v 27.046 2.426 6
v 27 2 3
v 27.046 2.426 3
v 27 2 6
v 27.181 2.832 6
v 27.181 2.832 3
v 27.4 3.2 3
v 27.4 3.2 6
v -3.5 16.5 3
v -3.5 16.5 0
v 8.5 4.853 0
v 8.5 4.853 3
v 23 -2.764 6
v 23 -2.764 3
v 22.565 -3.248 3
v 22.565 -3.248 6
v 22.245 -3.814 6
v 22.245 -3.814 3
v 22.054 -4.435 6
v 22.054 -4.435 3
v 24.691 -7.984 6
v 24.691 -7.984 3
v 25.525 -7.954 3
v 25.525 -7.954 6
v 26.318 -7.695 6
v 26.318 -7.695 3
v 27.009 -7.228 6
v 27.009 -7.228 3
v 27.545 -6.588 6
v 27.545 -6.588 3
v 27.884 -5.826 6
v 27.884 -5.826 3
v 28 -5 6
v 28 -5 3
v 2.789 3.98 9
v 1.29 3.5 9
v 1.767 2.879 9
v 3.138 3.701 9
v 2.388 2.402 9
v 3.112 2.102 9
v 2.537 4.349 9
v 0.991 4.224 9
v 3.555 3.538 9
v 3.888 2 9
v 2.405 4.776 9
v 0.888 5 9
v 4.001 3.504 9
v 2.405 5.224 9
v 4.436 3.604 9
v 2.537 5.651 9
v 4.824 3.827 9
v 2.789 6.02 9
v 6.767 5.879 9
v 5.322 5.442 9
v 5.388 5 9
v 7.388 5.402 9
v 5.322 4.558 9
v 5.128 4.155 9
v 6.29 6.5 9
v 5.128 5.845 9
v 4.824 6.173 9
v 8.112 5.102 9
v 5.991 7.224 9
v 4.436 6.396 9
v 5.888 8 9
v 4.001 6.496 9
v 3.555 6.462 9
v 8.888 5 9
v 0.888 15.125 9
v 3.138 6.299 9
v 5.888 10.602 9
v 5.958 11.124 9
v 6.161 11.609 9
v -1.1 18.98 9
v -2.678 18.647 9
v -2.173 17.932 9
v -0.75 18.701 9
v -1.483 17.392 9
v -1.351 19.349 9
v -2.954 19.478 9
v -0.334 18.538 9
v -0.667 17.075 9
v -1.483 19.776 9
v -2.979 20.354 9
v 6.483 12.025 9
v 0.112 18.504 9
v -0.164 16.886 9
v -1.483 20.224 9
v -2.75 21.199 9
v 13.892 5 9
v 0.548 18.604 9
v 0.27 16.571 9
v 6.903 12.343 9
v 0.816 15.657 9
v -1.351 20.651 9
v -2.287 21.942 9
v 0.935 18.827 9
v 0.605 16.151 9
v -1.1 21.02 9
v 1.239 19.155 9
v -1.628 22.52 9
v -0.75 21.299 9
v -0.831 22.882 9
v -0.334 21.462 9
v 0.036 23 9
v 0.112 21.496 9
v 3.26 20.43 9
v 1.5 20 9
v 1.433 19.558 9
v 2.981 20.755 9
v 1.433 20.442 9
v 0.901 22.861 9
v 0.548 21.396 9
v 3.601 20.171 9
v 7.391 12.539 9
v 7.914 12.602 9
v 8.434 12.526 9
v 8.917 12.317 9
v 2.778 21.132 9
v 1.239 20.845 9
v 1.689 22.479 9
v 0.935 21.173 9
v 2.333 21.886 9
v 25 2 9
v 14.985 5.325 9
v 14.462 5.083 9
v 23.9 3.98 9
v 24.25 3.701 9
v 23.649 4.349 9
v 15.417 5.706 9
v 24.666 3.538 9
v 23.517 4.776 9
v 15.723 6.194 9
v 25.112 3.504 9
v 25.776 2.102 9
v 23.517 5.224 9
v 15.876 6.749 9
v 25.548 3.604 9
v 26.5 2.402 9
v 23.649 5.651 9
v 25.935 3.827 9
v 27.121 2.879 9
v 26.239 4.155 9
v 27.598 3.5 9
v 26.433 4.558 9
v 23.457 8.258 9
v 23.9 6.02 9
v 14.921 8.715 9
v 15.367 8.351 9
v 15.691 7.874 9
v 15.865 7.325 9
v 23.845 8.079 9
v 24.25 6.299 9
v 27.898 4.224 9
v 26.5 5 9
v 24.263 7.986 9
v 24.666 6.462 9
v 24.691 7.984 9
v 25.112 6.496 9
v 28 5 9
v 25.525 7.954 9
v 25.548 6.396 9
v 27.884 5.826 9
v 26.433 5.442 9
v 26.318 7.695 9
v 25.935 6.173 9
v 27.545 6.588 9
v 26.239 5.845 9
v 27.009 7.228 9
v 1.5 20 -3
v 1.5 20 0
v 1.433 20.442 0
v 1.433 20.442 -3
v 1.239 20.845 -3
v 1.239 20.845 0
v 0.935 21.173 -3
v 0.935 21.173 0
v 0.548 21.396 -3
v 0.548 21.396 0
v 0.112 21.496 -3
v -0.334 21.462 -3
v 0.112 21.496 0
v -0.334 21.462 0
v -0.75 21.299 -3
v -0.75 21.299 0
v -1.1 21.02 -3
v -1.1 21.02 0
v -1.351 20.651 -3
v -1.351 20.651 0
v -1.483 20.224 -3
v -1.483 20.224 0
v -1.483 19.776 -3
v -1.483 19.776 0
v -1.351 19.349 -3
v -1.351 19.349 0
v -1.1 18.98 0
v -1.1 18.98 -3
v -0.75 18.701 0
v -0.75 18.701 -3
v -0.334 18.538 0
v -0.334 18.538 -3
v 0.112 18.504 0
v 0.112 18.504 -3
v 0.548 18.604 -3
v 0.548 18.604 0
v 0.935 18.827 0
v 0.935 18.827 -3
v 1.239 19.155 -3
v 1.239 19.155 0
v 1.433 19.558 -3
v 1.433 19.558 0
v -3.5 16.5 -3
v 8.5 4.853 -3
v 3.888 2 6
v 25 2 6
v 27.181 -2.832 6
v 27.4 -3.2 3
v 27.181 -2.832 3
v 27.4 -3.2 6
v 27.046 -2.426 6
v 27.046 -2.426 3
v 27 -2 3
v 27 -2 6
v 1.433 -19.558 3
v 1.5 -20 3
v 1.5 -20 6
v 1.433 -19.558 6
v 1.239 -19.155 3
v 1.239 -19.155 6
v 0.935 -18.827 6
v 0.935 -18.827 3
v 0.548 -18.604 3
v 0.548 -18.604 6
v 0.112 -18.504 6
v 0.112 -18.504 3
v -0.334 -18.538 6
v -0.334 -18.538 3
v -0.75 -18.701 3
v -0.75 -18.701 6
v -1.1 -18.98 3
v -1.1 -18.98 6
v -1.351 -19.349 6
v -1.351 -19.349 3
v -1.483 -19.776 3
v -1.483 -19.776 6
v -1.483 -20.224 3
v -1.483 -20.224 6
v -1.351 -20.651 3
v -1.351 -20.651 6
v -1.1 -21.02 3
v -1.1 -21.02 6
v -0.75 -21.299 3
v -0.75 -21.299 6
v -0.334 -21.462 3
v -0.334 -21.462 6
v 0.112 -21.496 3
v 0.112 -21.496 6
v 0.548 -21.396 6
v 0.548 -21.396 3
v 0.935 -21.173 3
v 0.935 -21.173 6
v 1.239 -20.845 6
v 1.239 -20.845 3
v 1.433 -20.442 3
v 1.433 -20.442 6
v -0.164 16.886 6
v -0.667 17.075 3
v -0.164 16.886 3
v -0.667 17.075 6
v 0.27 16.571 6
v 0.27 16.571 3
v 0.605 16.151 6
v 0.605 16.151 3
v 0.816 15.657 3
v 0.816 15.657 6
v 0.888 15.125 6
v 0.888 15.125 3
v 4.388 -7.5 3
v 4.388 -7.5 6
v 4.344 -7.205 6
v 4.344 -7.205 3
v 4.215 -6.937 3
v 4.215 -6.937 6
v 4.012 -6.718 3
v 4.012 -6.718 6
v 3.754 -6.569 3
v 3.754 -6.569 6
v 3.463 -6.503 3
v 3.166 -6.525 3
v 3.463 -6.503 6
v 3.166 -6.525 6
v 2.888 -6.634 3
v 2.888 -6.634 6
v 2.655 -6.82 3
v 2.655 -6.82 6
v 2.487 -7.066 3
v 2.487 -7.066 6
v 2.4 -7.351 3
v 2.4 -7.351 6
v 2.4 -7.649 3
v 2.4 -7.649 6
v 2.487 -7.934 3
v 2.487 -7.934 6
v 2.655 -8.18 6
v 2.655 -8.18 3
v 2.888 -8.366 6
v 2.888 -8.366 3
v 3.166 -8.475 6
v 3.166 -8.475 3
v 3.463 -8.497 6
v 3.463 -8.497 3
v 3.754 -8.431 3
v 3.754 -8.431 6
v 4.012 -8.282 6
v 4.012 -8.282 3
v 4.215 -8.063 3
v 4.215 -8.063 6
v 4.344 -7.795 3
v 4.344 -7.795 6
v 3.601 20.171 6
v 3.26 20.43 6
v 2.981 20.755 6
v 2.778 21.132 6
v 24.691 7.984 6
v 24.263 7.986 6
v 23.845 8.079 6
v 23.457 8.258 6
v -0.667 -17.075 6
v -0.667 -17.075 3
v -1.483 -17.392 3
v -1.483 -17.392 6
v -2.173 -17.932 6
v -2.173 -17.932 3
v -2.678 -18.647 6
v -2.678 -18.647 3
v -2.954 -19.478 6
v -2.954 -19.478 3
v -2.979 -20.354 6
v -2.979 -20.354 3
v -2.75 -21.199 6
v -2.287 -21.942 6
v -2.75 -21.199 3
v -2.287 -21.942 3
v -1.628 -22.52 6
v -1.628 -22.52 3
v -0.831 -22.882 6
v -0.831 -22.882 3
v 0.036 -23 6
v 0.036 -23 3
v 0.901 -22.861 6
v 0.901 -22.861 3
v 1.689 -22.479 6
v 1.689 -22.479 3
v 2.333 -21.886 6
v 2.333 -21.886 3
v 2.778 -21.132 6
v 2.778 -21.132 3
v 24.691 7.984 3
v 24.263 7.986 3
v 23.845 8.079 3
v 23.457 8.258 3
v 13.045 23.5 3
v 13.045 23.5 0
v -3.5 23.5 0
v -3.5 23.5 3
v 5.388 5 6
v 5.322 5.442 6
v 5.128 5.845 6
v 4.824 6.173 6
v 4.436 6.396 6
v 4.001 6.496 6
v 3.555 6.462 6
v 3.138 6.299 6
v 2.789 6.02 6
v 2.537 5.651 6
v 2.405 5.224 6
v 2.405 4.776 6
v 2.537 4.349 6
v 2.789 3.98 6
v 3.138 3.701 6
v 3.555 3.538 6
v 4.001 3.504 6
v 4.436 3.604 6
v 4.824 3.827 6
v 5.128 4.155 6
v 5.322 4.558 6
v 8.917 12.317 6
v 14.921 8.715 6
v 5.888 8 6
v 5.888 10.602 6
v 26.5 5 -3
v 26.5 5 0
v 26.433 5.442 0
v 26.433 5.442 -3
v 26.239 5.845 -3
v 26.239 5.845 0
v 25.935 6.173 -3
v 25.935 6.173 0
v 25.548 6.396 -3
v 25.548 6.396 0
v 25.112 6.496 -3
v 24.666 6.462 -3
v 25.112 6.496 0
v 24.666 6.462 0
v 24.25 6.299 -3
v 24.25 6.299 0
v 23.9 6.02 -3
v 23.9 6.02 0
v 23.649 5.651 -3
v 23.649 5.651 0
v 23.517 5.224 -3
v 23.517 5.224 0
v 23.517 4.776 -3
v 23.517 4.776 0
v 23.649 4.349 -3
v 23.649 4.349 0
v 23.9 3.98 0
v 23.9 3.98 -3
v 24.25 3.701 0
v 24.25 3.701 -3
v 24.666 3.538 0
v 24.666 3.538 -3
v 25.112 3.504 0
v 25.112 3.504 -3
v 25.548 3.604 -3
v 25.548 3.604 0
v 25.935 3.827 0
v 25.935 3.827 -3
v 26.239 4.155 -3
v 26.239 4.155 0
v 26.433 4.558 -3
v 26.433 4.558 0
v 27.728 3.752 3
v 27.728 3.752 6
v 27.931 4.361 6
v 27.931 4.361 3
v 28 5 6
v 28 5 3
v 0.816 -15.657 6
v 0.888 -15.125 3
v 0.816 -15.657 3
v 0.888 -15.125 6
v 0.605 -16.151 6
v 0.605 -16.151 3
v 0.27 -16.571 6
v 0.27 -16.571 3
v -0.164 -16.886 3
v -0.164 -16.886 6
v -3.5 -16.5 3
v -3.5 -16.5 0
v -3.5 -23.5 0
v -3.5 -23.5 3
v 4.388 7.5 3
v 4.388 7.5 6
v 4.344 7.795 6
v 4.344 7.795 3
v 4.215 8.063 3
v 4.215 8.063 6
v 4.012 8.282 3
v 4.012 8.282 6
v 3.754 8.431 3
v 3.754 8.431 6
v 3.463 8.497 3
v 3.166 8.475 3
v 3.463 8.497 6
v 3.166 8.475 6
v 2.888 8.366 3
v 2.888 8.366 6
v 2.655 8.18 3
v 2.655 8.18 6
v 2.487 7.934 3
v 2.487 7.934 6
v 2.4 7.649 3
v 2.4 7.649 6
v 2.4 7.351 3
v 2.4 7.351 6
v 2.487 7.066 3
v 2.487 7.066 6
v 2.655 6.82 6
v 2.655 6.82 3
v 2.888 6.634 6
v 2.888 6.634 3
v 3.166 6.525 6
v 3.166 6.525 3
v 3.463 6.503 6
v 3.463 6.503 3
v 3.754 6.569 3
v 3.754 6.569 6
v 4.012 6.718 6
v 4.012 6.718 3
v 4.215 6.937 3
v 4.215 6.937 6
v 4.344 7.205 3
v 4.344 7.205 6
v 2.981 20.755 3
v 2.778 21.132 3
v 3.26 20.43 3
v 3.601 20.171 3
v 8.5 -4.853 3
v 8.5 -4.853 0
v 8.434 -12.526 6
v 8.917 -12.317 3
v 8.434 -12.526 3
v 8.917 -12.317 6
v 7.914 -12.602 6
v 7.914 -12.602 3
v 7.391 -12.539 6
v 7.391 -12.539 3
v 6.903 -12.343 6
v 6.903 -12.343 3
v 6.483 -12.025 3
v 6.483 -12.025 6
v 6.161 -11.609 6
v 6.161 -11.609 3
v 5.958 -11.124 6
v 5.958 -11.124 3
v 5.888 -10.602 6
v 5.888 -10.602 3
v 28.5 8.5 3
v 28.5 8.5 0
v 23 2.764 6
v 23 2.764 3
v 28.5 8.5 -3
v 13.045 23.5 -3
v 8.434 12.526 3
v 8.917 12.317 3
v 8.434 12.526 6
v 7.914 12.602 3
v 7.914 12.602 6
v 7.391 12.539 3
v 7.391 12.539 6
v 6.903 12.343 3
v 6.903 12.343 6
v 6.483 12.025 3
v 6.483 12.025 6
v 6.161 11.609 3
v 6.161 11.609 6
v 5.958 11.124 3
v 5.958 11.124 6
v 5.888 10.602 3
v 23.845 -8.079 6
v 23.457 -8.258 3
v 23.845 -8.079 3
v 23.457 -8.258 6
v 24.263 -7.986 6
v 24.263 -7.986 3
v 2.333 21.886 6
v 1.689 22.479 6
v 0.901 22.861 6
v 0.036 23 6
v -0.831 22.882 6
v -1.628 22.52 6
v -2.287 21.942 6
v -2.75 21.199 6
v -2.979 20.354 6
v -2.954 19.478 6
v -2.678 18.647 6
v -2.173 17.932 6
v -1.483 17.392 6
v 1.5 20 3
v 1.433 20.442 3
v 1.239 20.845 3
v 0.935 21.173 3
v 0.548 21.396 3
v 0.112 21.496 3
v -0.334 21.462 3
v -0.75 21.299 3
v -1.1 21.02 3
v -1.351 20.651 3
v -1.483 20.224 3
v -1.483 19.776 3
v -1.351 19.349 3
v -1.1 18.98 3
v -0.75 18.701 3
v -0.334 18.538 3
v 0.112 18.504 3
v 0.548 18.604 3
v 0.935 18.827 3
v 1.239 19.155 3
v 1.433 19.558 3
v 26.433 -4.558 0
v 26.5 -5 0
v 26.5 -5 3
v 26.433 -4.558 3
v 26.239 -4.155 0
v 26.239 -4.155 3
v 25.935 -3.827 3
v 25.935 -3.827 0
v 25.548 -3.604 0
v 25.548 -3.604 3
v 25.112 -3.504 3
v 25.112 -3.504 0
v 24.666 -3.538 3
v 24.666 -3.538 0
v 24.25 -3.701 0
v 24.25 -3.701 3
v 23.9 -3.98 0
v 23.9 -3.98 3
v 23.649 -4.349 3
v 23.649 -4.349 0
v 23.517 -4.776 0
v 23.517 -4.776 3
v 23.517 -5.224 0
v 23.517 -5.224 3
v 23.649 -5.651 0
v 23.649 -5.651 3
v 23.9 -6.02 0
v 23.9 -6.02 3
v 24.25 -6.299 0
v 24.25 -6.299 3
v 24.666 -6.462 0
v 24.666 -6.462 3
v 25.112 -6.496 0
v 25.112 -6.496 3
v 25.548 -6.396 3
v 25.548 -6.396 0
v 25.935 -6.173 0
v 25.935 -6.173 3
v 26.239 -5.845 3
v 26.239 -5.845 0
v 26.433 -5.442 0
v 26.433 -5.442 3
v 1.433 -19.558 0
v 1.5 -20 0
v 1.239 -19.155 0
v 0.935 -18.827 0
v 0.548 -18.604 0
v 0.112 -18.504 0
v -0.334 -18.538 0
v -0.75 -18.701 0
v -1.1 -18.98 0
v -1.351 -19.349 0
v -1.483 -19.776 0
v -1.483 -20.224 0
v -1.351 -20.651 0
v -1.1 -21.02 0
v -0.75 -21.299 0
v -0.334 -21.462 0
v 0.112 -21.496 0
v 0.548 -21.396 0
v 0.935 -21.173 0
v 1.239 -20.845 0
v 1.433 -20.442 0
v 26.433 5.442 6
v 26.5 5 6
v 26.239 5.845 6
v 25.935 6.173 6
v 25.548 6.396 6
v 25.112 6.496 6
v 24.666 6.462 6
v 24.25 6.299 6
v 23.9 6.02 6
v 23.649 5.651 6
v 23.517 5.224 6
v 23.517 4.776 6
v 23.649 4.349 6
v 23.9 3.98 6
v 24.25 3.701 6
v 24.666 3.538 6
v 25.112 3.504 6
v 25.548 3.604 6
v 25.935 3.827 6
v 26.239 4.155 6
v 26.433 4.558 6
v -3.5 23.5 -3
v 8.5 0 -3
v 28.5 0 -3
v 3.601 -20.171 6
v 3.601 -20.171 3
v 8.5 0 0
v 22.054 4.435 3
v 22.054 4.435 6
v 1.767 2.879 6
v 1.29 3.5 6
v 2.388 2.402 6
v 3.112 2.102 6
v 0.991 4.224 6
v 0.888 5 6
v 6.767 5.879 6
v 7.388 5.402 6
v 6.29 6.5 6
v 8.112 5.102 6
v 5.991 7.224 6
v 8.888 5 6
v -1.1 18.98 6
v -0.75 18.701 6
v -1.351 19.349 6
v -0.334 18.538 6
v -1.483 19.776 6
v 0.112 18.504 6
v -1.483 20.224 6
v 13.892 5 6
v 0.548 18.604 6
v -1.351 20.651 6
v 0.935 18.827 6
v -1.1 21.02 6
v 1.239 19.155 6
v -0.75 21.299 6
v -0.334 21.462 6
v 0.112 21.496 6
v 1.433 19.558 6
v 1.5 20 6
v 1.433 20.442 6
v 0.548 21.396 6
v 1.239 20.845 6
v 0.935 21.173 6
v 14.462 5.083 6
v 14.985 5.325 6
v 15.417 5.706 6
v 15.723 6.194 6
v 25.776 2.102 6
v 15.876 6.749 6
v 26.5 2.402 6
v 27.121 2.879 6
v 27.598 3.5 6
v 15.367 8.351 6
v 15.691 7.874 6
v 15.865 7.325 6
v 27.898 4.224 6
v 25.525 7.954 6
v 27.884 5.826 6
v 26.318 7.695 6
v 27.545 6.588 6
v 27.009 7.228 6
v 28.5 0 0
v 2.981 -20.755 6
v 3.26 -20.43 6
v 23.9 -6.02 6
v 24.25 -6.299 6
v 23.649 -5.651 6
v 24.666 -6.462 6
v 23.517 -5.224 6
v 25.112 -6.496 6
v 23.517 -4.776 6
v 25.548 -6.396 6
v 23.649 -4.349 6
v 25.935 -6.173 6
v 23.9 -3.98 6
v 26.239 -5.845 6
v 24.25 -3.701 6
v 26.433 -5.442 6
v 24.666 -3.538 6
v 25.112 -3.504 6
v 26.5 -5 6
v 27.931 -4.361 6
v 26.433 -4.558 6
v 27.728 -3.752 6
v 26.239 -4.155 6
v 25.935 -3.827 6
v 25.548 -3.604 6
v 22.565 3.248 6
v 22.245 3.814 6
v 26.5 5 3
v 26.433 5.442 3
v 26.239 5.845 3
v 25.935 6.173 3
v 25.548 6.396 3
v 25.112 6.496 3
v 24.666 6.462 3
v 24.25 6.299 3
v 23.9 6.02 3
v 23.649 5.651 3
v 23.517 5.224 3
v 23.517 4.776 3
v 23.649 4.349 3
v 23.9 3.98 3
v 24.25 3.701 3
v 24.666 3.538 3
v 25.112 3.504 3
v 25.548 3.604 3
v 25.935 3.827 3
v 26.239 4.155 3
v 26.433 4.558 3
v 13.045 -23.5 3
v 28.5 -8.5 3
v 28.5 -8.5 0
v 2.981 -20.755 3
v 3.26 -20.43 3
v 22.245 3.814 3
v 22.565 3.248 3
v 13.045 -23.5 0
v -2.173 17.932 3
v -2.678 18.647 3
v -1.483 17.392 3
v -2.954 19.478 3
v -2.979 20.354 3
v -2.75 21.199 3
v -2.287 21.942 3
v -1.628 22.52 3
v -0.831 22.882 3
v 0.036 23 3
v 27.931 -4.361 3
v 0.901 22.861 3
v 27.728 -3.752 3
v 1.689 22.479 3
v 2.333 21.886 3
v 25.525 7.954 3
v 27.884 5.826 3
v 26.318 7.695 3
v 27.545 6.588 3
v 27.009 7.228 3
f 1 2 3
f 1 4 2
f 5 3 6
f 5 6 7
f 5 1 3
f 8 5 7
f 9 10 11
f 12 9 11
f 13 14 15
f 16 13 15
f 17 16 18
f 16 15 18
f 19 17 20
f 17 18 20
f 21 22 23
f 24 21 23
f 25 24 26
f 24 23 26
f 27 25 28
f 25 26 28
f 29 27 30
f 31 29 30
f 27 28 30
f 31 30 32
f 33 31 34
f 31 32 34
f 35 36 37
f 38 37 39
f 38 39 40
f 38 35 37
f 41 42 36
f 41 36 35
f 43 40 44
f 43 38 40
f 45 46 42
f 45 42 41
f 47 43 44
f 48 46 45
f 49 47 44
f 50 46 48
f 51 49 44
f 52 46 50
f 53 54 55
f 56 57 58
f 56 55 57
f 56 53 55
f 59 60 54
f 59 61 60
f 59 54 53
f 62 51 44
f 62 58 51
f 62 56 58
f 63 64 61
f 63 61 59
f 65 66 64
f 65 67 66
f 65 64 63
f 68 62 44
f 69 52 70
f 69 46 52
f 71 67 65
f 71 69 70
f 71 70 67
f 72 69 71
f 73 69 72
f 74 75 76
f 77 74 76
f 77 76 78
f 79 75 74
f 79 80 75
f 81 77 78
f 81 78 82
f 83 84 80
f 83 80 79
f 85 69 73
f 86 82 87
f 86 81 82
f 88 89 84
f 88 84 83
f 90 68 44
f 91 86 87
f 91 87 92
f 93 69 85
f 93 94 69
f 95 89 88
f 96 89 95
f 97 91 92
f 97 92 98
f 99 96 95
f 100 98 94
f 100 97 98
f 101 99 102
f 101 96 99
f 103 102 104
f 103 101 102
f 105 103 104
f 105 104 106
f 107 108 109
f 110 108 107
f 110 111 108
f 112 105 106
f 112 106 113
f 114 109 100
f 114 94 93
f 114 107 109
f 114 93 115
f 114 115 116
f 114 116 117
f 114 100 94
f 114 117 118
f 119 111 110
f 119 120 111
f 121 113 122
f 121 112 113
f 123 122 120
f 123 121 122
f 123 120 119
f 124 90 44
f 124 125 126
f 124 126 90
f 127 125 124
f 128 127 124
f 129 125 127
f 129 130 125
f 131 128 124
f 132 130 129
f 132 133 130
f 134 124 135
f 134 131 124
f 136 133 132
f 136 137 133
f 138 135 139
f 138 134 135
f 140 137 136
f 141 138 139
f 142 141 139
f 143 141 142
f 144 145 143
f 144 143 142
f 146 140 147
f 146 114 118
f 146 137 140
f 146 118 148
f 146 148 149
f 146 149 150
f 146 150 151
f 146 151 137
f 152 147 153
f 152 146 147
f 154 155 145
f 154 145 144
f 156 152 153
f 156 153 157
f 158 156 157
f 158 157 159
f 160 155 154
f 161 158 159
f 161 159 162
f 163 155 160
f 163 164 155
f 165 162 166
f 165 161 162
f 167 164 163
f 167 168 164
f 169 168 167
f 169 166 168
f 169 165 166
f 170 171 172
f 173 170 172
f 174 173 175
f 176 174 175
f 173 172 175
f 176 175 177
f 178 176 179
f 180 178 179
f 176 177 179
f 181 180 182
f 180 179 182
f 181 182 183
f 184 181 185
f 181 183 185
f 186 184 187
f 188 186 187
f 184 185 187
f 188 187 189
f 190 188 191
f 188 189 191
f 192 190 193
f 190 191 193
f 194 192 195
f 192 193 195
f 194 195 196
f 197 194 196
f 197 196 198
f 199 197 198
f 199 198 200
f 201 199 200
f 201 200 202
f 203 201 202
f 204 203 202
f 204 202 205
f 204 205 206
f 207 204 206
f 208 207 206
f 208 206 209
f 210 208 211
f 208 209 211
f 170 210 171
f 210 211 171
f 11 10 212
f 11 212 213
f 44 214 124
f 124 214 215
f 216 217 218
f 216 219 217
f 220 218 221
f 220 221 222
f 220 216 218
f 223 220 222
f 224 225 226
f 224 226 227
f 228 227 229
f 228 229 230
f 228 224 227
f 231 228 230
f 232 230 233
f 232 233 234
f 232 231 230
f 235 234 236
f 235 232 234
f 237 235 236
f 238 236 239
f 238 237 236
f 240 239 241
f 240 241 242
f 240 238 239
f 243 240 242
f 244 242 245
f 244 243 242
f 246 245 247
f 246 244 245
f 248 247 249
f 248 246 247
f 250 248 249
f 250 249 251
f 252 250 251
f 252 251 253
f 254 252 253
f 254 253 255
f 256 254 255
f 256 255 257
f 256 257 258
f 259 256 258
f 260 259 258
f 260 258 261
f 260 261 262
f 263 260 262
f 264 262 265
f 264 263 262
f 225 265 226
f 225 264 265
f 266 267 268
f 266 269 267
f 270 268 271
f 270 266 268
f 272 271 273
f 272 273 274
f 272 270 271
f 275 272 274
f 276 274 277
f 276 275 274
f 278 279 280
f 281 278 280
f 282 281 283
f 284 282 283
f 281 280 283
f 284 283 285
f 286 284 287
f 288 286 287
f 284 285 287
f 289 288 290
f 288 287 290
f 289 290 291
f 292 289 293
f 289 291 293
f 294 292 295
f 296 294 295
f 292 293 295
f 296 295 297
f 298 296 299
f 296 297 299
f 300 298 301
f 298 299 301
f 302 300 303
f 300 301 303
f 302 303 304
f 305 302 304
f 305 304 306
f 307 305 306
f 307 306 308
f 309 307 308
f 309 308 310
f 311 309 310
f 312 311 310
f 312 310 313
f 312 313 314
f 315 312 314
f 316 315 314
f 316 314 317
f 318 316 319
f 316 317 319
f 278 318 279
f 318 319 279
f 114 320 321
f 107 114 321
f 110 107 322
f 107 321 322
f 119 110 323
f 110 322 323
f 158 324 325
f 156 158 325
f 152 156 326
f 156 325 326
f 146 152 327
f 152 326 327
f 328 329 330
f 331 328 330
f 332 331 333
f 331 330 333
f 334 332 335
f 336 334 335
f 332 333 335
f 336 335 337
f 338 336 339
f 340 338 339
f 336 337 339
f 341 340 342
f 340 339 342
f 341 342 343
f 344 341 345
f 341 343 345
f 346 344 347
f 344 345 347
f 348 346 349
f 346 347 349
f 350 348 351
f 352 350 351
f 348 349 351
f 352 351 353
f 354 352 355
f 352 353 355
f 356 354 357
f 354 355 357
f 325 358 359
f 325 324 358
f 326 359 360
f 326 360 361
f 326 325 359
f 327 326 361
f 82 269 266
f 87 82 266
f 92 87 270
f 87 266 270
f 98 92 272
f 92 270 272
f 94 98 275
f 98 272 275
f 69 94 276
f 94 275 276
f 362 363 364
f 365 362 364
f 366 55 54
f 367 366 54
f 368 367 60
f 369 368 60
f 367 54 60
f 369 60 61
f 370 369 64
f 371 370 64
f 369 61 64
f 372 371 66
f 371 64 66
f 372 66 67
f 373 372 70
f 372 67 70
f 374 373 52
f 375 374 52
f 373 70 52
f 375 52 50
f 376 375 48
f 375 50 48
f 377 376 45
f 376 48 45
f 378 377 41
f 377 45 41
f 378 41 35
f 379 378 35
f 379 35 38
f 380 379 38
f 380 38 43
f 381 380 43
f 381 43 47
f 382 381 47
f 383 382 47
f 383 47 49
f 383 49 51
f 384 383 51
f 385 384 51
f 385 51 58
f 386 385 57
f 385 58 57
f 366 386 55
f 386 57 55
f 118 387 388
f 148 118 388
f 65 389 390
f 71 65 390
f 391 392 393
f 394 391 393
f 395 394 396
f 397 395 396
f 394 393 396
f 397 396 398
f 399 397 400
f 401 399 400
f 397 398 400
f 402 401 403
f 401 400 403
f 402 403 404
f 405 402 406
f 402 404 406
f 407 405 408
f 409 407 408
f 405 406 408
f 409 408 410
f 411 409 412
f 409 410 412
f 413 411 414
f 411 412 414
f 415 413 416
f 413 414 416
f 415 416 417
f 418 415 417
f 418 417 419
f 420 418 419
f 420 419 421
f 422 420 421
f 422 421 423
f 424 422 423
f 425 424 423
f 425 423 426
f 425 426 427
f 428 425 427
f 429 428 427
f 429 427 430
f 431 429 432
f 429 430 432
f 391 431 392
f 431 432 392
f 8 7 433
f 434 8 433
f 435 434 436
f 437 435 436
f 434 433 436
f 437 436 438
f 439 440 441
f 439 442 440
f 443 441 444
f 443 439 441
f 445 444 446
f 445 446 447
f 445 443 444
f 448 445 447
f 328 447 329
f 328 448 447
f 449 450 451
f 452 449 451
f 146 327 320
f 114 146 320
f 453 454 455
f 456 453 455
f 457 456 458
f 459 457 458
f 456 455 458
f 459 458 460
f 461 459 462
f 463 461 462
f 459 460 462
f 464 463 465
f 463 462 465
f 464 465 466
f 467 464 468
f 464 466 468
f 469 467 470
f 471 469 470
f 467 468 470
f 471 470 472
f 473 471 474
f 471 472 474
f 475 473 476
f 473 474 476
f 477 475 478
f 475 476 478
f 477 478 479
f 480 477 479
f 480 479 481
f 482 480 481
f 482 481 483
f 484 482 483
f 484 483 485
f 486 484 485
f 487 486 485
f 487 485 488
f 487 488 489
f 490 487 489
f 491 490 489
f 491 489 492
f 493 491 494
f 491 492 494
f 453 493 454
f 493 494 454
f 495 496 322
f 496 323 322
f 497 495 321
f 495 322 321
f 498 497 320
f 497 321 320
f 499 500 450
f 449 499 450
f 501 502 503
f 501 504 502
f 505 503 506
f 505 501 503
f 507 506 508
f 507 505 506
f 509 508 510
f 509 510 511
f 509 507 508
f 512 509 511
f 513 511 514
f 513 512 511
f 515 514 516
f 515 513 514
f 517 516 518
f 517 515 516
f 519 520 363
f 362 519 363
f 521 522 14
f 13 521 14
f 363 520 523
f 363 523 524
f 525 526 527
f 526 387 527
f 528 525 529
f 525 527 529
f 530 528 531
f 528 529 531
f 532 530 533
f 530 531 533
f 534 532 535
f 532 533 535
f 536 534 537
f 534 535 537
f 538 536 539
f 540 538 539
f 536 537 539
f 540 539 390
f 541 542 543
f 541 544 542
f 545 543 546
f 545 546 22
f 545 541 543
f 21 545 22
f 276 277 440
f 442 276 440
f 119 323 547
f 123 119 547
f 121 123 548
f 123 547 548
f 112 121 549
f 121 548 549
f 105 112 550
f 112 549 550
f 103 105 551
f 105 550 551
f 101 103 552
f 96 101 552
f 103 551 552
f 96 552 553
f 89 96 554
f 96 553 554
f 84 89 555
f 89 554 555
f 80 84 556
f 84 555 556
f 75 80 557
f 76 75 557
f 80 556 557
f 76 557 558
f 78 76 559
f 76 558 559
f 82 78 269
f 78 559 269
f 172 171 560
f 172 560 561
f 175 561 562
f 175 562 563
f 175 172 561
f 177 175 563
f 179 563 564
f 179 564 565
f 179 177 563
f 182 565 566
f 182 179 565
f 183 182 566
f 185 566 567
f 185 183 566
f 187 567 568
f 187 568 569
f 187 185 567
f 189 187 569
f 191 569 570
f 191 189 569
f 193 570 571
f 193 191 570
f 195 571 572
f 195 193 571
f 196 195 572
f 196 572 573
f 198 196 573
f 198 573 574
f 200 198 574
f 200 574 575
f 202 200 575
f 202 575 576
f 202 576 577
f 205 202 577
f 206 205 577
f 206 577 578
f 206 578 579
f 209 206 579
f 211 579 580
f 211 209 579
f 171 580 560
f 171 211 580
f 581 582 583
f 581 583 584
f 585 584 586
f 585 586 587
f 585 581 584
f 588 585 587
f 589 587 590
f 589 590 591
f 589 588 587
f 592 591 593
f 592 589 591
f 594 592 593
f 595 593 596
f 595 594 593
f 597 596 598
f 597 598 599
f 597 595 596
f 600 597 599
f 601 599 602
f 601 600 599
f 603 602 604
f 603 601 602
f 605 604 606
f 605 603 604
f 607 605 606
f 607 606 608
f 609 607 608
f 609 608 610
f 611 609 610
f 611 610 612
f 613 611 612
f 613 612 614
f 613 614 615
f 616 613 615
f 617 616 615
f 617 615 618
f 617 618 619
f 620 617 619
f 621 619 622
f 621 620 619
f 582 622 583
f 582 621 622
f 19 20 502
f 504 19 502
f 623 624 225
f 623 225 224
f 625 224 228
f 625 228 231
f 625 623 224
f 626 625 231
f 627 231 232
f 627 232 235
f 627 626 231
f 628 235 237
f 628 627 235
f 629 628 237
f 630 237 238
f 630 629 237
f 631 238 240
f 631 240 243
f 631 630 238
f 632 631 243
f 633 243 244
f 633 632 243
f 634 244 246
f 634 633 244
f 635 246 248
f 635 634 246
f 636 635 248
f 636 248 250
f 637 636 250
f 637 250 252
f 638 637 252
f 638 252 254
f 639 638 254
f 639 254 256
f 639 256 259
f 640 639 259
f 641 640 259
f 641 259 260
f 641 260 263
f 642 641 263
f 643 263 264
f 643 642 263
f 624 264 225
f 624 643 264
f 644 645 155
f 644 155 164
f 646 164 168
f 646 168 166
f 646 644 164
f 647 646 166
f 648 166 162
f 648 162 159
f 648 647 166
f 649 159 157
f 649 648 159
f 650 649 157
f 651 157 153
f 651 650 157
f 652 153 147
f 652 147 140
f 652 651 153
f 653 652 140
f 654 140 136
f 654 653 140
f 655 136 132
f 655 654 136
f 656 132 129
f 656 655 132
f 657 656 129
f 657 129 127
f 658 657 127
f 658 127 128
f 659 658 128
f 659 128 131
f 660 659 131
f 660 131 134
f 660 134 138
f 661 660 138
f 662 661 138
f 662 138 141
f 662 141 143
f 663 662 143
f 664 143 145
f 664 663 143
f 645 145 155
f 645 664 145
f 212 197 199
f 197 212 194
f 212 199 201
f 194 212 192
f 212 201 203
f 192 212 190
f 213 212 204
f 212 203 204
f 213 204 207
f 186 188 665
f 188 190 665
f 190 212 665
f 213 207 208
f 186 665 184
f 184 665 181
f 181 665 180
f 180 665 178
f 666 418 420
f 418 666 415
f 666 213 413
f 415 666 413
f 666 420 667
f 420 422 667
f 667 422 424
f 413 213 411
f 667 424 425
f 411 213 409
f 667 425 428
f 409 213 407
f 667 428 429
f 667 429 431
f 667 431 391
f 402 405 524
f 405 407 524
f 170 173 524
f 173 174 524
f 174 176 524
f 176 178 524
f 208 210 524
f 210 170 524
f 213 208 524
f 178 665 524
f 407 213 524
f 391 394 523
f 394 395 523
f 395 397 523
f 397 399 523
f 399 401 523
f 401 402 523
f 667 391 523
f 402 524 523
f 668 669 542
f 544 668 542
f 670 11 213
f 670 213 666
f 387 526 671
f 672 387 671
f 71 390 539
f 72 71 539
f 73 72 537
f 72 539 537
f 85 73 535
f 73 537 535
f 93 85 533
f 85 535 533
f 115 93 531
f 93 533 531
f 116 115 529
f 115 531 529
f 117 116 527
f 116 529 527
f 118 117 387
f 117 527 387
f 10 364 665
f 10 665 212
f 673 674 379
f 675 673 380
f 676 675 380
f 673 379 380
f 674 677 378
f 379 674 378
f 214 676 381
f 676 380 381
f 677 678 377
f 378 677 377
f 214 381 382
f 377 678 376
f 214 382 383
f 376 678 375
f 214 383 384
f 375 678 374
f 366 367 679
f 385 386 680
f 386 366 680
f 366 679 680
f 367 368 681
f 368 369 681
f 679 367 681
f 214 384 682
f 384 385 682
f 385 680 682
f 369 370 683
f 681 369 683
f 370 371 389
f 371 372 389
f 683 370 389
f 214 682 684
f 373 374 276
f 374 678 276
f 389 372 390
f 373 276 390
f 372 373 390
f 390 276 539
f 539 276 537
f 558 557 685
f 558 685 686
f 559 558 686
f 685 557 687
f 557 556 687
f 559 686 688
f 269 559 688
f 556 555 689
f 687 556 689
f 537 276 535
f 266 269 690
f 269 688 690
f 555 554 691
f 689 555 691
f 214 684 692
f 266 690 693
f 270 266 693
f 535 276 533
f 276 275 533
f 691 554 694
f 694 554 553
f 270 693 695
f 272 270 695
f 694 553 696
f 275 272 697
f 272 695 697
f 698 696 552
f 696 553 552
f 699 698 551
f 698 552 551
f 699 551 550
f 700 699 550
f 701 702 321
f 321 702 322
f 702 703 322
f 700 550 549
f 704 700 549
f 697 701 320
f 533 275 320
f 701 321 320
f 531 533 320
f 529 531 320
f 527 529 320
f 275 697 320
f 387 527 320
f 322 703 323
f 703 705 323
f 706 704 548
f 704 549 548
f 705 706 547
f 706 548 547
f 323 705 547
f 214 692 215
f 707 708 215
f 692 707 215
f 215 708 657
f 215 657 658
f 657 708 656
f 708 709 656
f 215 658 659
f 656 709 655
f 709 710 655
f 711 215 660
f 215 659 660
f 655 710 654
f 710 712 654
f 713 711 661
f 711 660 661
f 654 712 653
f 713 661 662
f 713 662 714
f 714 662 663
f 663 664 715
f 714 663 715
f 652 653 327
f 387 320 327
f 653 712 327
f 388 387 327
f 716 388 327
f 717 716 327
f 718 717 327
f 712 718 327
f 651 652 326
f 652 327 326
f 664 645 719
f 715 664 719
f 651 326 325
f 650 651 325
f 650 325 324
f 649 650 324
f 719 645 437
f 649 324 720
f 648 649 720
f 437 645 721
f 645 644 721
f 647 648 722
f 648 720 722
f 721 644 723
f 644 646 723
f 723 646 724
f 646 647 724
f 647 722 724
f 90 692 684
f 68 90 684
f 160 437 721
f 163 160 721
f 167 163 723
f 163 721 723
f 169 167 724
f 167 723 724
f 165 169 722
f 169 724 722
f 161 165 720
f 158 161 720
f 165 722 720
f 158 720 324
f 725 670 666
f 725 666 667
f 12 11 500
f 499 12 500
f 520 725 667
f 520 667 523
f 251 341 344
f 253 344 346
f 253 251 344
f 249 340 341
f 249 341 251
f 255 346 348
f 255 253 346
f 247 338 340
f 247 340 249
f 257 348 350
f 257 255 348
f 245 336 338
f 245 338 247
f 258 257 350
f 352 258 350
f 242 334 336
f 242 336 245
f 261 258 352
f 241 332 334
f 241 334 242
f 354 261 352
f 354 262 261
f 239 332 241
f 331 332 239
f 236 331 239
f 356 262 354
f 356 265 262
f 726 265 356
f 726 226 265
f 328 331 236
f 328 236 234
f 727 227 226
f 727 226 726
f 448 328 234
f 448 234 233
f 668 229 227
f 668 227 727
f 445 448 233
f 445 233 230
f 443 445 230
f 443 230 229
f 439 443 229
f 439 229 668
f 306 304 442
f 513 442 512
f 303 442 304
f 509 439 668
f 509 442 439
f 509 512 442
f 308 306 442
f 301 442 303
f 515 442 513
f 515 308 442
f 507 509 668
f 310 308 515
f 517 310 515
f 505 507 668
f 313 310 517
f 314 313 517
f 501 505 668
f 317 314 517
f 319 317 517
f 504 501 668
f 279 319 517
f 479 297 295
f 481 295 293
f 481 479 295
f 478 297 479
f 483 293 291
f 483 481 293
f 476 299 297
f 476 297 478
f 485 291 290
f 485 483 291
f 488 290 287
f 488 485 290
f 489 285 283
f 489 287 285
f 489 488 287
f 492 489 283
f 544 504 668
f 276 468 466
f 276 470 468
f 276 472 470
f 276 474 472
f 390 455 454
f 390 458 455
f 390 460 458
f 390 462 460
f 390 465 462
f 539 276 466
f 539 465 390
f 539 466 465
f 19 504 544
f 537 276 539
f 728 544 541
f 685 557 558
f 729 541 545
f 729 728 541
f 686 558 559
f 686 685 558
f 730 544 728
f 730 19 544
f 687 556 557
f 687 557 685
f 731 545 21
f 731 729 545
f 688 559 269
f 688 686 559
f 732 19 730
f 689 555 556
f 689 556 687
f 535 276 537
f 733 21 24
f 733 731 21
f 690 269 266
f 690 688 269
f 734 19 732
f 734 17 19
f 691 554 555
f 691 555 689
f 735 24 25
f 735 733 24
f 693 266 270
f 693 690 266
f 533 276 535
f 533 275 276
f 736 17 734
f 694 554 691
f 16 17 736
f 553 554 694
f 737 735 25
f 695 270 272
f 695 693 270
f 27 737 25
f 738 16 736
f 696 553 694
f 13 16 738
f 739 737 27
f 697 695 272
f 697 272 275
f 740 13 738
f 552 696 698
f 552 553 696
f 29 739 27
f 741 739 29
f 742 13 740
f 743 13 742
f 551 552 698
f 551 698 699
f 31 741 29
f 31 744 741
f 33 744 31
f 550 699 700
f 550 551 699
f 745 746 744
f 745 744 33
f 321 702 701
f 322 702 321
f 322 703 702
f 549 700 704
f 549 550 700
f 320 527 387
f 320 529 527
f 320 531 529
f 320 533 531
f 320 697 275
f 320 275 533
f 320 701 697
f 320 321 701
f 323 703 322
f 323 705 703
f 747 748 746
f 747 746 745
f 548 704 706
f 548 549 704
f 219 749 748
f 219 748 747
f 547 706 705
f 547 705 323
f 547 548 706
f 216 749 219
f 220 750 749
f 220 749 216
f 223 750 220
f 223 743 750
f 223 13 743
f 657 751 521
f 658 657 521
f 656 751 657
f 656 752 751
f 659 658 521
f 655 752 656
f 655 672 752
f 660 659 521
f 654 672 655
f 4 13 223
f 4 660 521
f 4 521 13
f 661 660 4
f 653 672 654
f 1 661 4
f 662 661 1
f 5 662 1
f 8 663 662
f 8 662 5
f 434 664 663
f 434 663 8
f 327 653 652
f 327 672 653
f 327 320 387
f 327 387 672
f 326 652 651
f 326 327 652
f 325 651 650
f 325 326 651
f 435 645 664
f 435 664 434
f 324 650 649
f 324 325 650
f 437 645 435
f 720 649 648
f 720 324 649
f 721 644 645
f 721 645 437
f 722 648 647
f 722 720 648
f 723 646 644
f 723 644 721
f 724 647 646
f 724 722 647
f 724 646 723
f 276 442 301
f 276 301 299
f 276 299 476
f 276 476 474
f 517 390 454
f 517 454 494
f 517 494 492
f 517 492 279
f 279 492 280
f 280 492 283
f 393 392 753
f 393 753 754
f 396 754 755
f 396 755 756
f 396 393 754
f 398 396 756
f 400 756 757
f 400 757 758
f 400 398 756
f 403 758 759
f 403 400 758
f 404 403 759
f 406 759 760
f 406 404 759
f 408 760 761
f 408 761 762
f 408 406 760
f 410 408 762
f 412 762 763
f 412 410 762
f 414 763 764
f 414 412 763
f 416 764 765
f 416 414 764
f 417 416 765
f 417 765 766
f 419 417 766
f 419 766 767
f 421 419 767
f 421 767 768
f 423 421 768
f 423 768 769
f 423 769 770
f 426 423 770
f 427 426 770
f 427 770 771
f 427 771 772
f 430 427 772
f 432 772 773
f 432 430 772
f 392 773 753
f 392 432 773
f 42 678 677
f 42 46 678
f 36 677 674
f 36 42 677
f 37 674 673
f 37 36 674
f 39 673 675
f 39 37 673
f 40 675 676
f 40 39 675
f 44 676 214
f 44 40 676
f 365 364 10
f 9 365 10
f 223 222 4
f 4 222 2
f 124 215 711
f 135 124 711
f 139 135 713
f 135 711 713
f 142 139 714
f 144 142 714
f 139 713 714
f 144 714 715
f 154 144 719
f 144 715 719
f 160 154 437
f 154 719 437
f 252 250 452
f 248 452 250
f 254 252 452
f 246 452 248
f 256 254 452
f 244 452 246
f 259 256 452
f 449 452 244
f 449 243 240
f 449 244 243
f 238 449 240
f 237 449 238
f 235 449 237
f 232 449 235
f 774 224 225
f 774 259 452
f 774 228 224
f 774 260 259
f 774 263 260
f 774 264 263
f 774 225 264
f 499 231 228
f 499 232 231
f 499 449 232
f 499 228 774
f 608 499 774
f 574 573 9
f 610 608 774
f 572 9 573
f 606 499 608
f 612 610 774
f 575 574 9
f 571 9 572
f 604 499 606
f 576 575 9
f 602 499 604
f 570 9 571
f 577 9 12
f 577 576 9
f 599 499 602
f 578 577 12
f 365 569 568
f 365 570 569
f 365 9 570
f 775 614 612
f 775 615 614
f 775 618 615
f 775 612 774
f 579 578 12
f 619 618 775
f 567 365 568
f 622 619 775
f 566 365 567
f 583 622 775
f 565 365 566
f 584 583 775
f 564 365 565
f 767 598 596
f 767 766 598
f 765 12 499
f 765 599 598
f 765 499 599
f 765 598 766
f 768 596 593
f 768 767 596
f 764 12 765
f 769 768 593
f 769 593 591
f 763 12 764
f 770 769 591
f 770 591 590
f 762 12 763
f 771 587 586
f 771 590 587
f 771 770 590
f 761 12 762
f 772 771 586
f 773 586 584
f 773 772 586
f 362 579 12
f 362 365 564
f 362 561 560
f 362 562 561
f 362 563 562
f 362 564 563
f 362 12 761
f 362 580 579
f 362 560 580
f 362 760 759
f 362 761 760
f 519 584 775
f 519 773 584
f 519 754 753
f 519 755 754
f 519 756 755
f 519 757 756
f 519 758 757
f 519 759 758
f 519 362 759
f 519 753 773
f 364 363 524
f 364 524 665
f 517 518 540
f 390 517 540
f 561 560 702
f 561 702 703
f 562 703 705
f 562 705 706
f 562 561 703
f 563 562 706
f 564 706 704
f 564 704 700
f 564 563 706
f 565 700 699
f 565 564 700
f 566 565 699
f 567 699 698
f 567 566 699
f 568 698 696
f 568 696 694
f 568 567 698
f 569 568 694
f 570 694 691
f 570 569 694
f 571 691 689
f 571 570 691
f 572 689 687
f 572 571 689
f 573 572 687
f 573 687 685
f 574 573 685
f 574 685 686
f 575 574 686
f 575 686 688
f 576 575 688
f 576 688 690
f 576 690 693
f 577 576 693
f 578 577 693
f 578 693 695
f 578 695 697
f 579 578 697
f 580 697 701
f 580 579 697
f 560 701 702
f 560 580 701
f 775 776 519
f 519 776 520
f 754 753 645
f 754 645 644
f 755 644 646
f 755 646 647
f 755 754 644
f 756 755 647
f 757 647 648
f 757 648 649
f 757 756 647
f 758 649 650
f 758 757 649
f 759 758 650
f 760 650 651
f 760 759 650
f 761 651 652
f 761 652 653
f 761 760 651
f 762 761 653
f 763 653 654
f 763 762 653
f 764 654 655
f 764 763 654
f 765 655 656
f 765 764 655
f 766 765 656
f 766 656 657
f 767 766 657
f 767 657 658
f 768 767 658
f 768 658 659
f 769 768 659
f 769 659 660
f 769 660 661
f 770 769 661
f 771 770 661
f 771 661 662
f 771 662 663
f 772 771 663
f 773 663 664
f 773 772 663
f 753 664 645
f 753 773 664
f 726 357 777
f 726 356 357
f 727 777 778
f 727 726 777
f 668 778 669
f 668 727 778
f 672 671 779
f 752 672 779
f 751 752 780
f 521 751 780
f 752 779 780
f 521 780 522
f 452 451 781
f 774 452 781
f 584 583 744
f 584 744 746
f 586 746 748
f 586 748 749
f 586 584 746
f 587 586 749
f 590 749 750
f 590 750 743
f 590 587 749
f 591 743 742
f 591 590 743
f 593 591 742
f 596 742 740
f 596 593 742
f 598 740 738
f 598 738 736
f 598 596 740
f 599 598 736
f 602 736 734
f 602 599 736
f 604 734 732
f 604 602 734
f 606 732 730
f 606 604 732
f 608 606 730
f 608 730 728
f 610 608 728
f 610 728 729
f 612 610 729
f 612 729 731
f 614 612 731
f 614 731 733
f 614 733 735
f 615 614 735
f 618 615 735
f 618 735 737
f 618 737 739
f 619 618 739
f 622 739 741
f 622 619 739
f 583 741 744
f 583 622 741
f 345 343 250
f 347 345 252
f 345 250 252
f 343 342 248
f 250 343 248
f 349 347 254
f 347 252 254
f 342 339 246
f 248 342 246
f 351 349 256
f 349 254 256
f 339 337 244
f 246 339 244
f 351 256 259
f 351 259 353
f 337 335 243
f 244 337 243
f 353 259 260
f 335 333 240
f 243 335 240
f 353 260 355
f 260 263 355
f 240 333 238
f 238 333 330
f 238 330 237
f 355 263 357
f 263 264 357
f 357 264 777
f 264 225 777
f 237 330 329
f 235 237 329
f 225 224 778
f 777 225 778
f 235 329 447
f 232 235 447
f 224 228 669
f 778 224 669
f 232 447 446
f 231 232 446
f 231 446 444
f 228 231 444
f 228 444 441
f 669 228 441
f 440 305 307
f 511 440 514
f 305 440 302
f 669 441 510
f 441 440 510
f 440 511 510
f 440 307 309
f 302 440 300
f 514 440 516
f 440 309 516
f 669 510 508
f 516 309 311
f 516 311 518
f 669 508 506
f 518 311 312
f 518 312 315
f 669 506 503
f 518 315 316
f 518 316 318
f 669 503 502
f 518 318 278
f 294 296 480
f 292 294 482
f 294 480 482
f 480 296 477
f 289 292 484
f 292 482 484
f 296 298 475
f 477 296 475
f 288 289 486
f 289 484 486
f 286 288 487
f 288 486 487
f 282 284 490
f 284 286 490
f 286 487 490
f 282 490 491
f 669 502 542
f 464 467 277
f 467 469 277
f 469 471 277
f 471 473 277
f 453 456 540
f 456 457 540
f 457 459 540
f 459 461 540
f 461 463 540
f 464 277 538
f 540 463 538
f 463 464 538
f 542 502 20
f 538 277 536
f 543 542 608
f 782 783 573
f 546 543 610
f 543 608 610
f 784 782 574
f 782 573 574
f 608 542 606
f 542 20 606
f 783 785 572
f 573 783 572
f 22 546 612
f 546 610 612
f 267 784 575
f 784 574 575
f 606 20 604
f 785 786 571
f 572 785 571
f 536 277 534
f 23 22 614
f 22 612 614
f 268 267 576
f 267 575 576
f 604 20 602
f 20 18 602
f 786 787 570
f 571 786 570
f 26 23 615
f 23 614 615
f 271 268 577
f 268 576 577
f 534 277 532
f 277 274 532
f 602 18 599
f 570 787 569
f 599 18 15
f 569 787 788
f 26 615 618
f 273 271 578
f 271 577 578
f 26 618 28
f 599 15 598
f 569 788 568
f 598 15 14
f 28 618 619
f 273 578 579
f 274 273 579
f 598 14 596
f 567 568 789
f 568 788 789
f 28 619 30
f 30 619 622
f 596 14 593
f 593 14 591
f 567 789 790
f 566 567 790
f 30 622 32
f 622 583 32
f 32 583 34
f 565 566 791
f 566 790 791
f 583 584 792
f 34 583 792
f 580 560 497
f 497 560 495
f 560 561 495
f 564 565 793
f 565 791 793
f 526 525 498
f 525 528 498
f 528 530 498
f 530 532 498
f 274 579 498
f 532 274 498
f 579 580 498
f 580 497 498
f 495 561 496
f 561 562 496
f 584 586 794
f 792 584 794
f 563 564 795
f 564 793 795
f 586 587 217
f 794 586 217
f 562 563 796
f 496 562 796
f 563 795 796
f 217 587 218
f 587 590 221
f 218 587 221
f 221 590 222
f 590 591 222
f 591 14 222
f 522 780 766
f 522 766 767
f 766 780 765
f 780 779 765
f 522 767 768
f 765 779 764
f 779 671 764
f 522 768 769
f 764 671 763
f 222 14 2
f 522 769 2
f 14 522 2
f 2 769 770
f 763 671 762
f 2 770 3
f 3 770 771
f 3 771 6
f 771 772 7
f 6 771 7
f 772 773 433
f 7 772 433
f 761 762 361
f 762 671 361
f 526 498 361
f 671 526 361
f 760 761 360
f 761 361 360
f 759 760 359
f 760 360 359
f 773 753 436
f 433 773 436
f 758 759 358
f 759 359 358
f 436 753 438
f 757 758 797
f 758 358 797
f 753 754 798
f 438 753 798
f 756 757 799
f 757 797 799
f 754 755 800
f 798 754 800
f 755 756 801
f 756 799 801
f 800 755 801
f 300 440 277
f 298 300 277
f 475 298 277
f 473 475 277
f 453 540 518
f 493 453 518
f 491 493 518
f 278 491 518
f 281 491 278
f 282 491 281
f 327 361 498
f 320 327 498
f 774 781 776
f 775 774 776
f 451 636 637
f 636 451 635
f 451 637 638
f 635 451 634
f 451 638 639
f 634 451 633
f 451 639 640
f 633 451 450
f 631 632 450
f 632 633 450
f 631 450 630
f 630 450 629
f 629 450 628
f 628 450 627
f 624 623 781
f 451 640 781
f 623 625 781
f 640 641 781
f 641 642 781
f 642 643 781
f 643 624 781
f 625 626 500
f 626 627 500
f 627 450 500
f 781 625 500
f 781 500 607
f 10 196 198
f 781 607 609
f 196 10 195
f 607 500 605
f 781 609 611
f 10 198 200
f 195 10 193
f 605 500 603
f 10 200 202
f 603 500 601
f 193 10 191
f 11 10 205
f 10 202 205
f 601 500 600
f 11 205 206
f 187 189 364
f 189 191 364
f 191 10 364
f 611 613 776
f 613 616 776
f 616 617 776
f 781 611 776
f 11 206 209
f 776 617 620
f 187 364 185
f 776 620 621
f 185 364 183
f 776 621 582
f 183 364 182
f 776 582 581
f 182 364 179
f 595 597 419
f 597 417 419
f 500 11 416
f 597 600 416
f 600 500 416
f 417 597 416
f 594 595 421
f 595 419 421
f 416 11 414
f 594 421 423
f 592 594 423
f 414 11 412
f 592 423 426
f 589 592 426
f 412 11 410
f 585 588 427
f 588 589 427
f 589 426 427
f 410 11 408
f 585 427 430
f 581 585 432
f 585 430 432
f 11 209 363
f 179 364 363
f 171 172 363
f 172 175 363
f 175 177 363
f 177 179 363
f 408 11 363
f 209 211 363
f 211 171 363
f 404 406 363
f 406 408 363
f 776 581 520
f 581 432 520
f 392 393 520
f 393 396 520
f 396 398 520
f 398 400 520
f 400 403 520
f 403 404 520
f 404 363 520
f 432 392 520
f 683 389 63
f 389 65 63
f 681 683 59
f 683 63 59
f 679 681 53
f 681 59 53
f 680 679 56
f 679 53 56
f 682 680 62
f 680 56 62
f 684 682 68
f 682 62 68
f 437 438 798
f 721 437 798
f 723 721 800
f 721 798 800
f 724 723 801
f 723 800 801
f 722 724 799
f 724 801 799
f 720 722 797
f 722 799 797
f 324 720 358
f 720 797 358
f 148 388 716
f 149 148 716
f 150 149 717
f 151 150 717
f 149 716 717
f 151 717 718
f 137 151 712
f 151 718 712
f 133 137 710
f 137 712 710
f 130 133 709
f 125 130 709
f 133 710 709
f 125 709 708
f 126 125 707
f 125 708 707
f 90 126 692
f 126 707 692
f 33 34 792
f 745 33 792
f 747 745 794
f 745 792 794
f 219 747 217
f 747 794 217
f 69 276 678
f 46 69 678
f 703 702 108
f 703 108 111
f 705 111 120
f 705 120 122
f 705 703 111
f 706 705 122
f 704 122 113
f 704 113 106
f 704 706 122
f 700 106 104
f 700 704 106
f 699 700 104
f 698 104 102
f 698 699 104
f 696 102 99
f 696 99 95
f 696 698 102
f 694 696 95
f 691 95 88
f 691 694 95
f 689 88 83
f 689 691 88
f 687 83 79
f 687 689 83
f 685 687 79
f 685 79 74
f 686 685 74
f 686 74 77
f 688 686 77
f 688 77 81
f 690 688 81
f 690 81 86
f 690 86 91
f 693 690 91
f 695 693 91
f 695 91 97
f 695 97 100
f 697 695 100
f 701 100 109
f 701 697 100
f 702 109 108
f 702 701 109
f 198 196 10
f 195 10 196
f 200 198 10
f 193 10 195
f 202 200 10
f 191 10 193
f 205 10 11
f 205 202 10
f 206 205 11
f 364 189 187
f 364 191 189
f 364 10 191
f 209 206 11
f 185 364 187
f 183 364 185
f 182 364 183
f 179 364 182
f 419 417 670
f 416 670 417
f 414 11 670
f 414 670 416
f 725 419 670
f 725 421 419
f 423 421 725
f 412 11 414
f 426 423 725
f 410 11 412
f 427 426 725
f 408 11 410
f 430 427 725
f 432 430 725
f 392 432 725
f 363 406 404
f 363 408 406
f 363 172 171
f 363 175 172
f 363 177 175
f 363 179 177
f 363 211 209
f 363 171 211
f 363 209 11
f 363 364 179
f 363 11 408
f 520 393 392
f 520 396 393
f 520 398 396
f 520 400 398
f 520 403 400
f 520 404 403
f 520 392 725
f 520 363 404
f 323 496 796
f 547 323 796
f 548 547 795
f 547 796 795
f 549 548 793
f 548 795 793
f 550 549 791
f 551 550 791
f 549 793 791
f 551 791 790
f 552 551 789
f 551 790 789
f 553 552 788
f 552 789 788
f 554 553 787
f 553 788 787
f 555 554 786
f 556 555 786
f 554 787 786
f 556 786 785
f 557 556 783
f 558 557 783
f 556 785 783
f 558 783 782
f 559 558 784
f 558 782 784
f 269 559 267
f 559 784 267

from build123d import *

# Parameters (mm, degrees)
F0_R      = 1.5
F1_DEPTH  = 3
F2_DEPTH  = 3
F3_R      = 1.5
F4_DEPTH  = 3
F5_R      = 2
F6_R      = 1.5
F7_DEPTH  = 3
F8_R      = 3
F9_R      = 1
F10_DEPTH = 3
F11_R     = 1.5
F12_DEPTH = 3


with BuildPart() as f1:
    # F0 (on Top) → F1 (new body)
    with BuildSketch(Plane.XY):
        Polygon((-3.5, 16.5), (8.5, 4.8529411765), (8.5, 0), (28.5, 0), (28.5, 8.5), (13.0454545455, 23.5), (-3.5, 23.5), align=None)
        with Locations((0, 20)):
            Circle(F0_R, mode=Mode.SUBTRACT)
        with Locations((25, 5)):
            Circle(F0_R, mode=Mode.SUBTRACT)
        Polygon((28.5, 0), (8.5, 0), (8.5, -4.8529411765), (-3.5, -16.5), (-3.5, -23.5), (13.0454545455, -23.5), (28.5, -8.5), align=None)
        with Locations((0, -20)):
            Circle(F0_R, mode=Mode.SUBTRACT)
        with Locations((25, -5)):
            Circle(F0_R, mode=Mode.SUBTRACT)
    extrude(amount=F1_DEPTH)


with BuildPart() as f2:
    # F0 (on Top) → F2 (new body)
    with BuildSketch(Plane.XY):
        Polygon((-3.5, 16.5), (8.5, 4.8529411765), (8.5, 0), (28.5, 0), (28.5, 8.5), (13.0454545455, 23.5), (-3.5, 23.5), align=None)
        with Locations((0, 20)):
            Circle(F0_R, mode=Mode.SUBTRACT)
        with Locations((25, 5)):
            Circle(F0_R, mode=Mode.SUBTRACT)
    extrude(amount=-F2_DEPTH)


with BuildPart() as f4:
    # F3 (on face) → F4 (new body)
    with BuildSketch(Plane.XY.offset(3)):
        with BuildLine():
            ThreePointArc((0.8884209613, 17.1345666653), (2.415084148, 18.2202897545), (3, 20))
            ThreePointArc((3, 20), (2.9865709391, 20.2835384022), (2.946403983, 20.5645383682))
            ThreePointArc((2.946403983, 20.5645383682), (-2.5724787771, 21.5434872663), (0.8884209613, 17.1345666653))
        make_face()
        with Locations((0, 20)):
            Circle(F3_R, mode=Mode.SUBTRACT)
        with BuildLine():
            ThreePointArc((3, -20), (2.415084148, -18.2202897545), (0.8884209613, -17.1345666653))
            ThreePointArc((0.8884209613, -17.1345666653), (-2.5724787771, -21.5434872663), (2.946403983, -20.5645383682))
            ThreePointArc((2.946403983, -20.5645383682), (2.9865709391, -20.2835384022), (3, -20))
        make_face()
        with Locations((0, -20)):
            Circle(F3_R, mode=Mode.SUBTRACT)
        with BuildLine():
            Line((27, -2.7639320225), (27, 2.7639320225))
            ThreePointArc((27, 2.7639320225), (25, 2), (23, 2.7639320225))
            Line((23, 2.7639320225), (23, -2.7639320225))
            ThreePointArc((23, -2.7639320225), (25, -2), (27, -2.7639320225))
        make_face()
        with BuildLine():
            ThreePointArc((28, 5), (26.7797102455, 7.415084148), (24.1115790387, 7.8654333347))
            ThreePointArc((24.1115790387, 7.8654333347), (22.4275212229, 6.5434872663), (22.053596017, 4.4354616318))
            ThreePointArc((22.053596017, 4.4354616318), (22.3894002797, 3.521903555), (23, 2.7639320225))
            ThreePointArc((23, 2.7639320225), (25, 2), (27, 2.7639320225))
            ThreePointArc((27, 2.7639320225), (27.7386127875, 3.7752551286), (28, 5))
        make_face()
        with Locations((25, 5)):
            Circle(F3_R, mode=Mode.SUBTRACT)
        with BuildLine():
            ThreePointArc((2.946403983, 20.5645383682), (2.9865709391, 20.2835384022), (3, 20))
            ThreePointArc((3, 20), (2.415084148, 18.2202897545), (0.8884209613, 17.1345666653))
            Line((0.8884209613, 17.1345666653), (5.8884209613, 14.1345666653))
            Line((5.8884209613, 14.1345666653), (22.053596017, 4.4354616318))
            ThreePointArc((22.053596017, 4.4354616318), (22.4275212229, 6.5434872663), (24.1115790387, 7.8654333347))
            Line((24.1115790387, 7.8654333347), (2.946403983, 20.5645383682))
        make_face()
        with BuildLine():
            ThreePointArc((28, -5), (27.7386127875, -3.7752551286), (27, -2.7639320225))
            ThreePointArc((27, -2.7639320225), (25, -2), (23, -2.7639320225))
            ThreePointArc((23, -2.7639320225), (22.3894002797, -3.521903555), (22.053596017, -4.4354616318))
            ThreePointArc((22.053596017, -4.4354616318), (22.4275212229, -6.5434872663), (24.1115790387, -7.8654333347))
            ThreePointArc((24.1115790387, -7.8654333347), (26.7797102455, -7.415084148), (28, -5))
        make_face()
        with Locations((25, -5)):
            Circle(F3_R, mode=Mode.SUBTRACT)
        with BuildLine():
            Line((5.8884209613, -14.1345666653), (0.8884209613, -17.1345666653))
            ThreePointArc((0.8884209613, -17.1345666653), (2.415084148, -18.2202897545), (3, -20))
            ThreePointArc((3, -20), (2.9865709391, -20.2835384022), (2.946403983, -20.5645383682))
            Line((2.946403983, -20.5645383682), (24.1115790387, -7.8654333347))
            ThreePointArc((24.1115790387, -7.8654333347), (22.4275212229, -6.5434872663), (22.053596017, -4.4354616318))
            Line((22.053596017, -4.4354616318), (5.8884209613, -14.1345666653))
        make_face()
        Polygon((5.8884209613, 14.1345666653), (0.8884209613, 17.1345666653), (0.8884209613, 12.2406502435), (5.8884209613, 7.387709067), align=None)
        Polygon((5.8884209613, -7.387709067), (0.8884209613, -12.2406502435), (0.8884209613, -17.1345666653), (5.8884209613, -14.1345666653), align=None)
        Polygon((5.8884209613, 7.387709067), (0.8884209613, 12.2406502435), (0.8884209613, -12.2406502435), (5.8884209613, -7.387709067), align=None)
    extrude(amount=F4_DEPTH)

    # F5
    f5_edges = [f4.edges().sort_by_distance(p)[0] for p in [
        (0.888421, 17.134567, 4.5),
        (0.888421, -17.134567, 4.5),
        (2.946404, -20.564538, 4.5),
        (24.111579, -7.865433, 4.5),
        (27, 2.763932, 4.5),
        (27, -2.763932, 4.5),
        (24.111579, 7.865433, 4.5),
        (5.888421, -14.134567, 4.5),
        (5.888421, 14.134567, 4.5),
        (2.946404, 20.564538, 4.5),
    ]]
    fillet(f5_edges, radius=F5_R)

    # F9 (on face) → F10 (cut, through all)
    with BuildSketch(Plane.XY.offset(6)):
        with Locations((3.3884209613, 7.5)):
            Circle(F9_R)
        with Locations((3.3884209613, -7.5)):
            Circle(F9_R)
    extrude(amount=-F10_DEPTH, mode=Mode.SUBTRACT)


with BuildPart() as f7:
    # F6 (on face) → F7 (new body)
    with BuildSketch(Plane.XY.offset(6)):
        with BuildLine():
            ThreePointArc((0.8884209613, 17.1345666653), (2.415084148, 18.2202897545), (3, 20))
            ThreePointArc((3, 20), (2.9865709391, 20.2835384022), (2.946403983, 20.5645383682))
            ThreePointArc((2.946403983, 20.5645383682), (2.8763632372, 20.8523699475), (2.7782770793, 21.1318906619))
            ThreePointArc((2.7782770793, 21.1318906619), (-2.2866711137, 21.9419410953), (-0.6669474232, 17.0750758754))
            ThreePointArc((-0.6669474232, 17.0750758754), (0.1146622018, 17.0021920376), (0.8884209613, 17.1345666653))
        make_face()
        with Locations((0, 20)):
            Circle(F6_R, mode=Mode.SUBTRACT)
        with BuildLine():
            ThreePointArc((2.946403983, 20.5645383682), (2.9865709391, 20.2835384022), (3, 20))
            ThreePointArc((3, 20), (2.415084148, 18.2202897545), (0.8884209613, 17.1345666653))
            Line((0.8884209613, 17.1345666653), (5.8884209613, 14.1345666653))
            Line((5.8884209613, 14.1345666653), (8.9174124721, 12.3171717588))
            Line((8.9174124721, 12.3171717588), (14.9210556511, 8.7149858514))
            ThreePointArc((14.9210556511, 8.7149858514), (15.8194939966, 6.4661328362), (13.8920641402, 5))
            Line((13.8920641402, 5), (5.8884209613, 5))
            Line((5.8884209613, 5), (5.8884209613, 2))
            Line((5.8884209613, 2), (25, 2))
            ThreePointArc((25, 2), (22.0338324386, 4.550722805), (24.1115790387, 7.8654333347))
            Line((24.1115790387, 7.8654333347), (23.4565127337, 8.2584731177))
            Line((23.4565127337, 8.2584731177), (3.601470288, 20.1714985851))
            Line((3.601470288, 20.1714985851), (2.946403983, 20.5645383682))
        make_face()
        with BuildLine():
            ThreePointArc((2.7782770793, 21.1318906619), (2.8763632372, 20.8523699475), (2.946403983, 20.5645383682))
            Line((2.946403983, 20.5645383682), (3.601470288, 20.1714985851))
            ThreePointArc((3.601470288, 20.1714985851), (3.1119485941, 20.5849016897), (2.7782770793, 21.1318906619))
        make_face()
        with BuildLine():
            Line((0.8884209613, 15.125126459), (0.8884209613, 17.1345666653))
            ThreePointArc((0.8884209613, 17.1345666653), (0.1146622018, 17.0021920376), (-0.6669474232, 17.0750758754))
            ThreePointArc((-0.6669474232, 17.0750758754), (0.4519527376, 16.3722705503), (0.8884209613, 15.125126459))
        make_face()
        Polygon((5.8884209613, 14.1345666653), (0.8884209613, 17.1345666653), (0.8884209613, 15.125126459), (0.8884209613, 2), (5.8884209613, 2), (5.8884209613, 5), (5.8884209613, 10.6021859074), align=None)
        with BuildLine():
            ThreePointArc((24.6913025467, 7.9840753815), (24.0516433289, 8.0210848488), (23.4565127337, 8.2584731177))
            Line((23.4565127337, 8.2584731177), (24.1115790387, 7.8654333347))
            ThreePointArc((24.1115790387, 7.8654333347), (24.3985084303, 7.9390828317), (24.6913025467, 7.9840753815))
        make_face()
        with BuildLine():
            ThreePointArc((24.6913025467, 7.9840753815), (24.3985084303, 7.9390828317), (24.1115790387, 7.8654333347))
            ThreePointArc((24.1115790387, 7.8654333347), (22.0338324386, 4.550722805), (25, 2))
            ThreePointArc((25, 2), (27.1213203436, 2.8786796564), (28, 5))
            ThreePointArc((28, 5), (27.0092172158, 7.2277895277), (24.6913025467, 7.9840753815))
        make_face()
        with Locations((25, 5)):
            Circle(F6_R, mode=Mode.SUBTRACT)
        with BuildLine():
            Line((8.9174124721, 12.3171717588), (5.8884209613, 14.1345666653))
            Line((5.8884209613, 14.1345666653), (5.8884209613, 10.6021859074))
            ThreePointArc((5.8884209613, 10.6021859074), (6.9030233313, 12.3425857209), (8.9174124721, 12.3171717588))
        make_face()
    extrude(amount=F7_DEPTH)

    # F8
    f8_edges = [f7.edges().sort_by_distance(p)[0] for p in [
        (5.888421, 5, 7.5),
        (0.888421, 2, 7.5),
    ]]
    fillet(f8_edges, radius=F8_R)

    # F11 (on face) → F12 (cut, through all)
    with BuildSketch(Plane.XY.offset(9)):
        with Locations((3.8884209613, 5)):
            Circle(F11_R)
    extrude(amount=-F12_DEPTH, mode=Mode.SUBTRACT)


solid = Compound([f1.part, f2.part, f4.part, f7.part])
